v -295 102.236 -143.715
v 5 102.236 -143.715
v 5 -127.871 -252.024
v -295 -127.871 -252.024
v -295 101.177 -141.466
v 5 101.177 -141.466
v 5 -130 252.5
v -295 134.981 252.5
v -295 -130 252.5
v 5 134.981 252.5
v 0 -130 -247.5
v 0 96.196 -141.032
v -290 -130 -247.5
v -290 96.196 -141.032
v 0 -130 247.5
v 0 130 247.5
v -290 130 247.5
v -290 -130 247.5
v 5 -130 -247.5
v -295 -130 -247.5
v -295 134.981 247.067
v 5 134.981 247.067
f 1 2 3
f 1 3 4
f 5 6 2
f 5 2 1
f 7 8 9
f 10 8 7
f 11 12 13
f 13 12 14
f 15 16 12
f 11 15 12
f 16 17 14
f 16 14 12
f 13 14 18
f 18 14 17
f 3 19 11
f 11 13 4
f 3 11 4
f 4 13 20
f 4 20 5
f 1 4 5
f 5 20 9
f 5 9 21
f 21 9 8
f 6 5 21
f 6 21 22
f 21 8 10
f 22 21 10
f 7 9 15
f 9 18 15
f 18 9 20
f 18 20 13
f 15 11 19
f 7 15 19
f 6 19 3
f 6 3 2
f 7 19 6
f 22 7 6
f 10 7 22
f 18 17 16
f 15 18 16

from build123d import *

# Parameters (mm, degrees)
BOSS_EXTRUDE1_DEPTH             = 5
SKETCH2_W                       = 300
SKETCH2_H                       = 390
BOSS_EXTRUDE2_DEPTH             = 5
BOSS_EXTRUDE3_DEPTH             = 5
SKETCH4_W                       = 300
SKETCH4_H                       = 254.322327046
BOSS_EXTRUDE4_DEPTH             = 5
SKETCH7_W                       = 300
SKETCH7_H                       = 264.981182322
BOSS_EXTRUDE7_DEPTH             = 5
BOSS_EXTRUDE7_DIRECTION_2_REACH = 597.625


with BuildPart() as part:
    # Sketch1 → Boss-Extrude1 (new body)
    with BuildSketch(Plane(origin=(0, 0, 0), x_dir=(0, 0, -1), z_dir=(1, 0, 0))):
        Polygon((-247.5, 130), (-247.5, -130), (247.5, -130), (141.03222111, 96.195959421), align=None)
    extrude(amount=BOSS_EXTRUDE1_DEPTH)

    # Sketch2 → Boss-Extrude2 (add)
    with BuildSketch(Plane(origin=(0, 107.651495361, -9.366161466), x_dir=(1, 0, 0), z_dir=(0, 0.9962364643840649, -0.08667702712678799))):
        with Locations((-145, -62.836538462)):
            Rectangle(SKETCH2_W, SKETCH2_H)
    extrude(amount=BOSS_EXTRUDE2_DEPTH)

    # Sketch3 → Boss-Extrude3 (add)
    with BuildSketch(Plane.ZY.offset(295)):
        Polygon((247.5, 130), (-141.03222111, 96.195959421), (-247.5, -130), (247.5, -130), align=None)
    extrude(amount=-BOSS_EXTRUDE3_DEPTH)

    # Sketch4 → Boss-Extrude4 (add)
    with BuildSketch(Plane(origin=(0, 71.789415399, -152.520094452), x_dir=(-1, 0, 0), z_dir=(0, 0.42587111556085877, -0.904783837682211))):
        with Locations((145, -95.863836477)):
            Rectangle(SKETCH4_W, SKETCH4_H)
    extrude(amount=BOSS_EXTRUDE4_DEPTH)

    # Sketch7 → Boss-Extrude7 (add)
    with BuildSketch(Plane.XY.offset(247.5)):
        with Locations((-145, 2.490591161)):
            Rectangle(SKETCH7_W, SKETCH7_H)
    extrude(amount=BOSS_EXTRUDE7_DEPTH)

    # Boss-Extrude7 direction 2: up to this face of the body (flat: up to its plane)
    boss_extrude7_direction_2_end = Plane(part.part.faces().sort_by_distance((-145, 132.490591161, 247.283307432))[0])
    # Sketch7 → Boss-Extrude7 direction 2 (add, up to the picked face)
    with BuildSketch(Plane.XY.offset(247.5), mode=Mode.PRIVATE) as boss_extrude7_direction_2_sk1:
        with Locations((-145, 2.490591161)):
            Rectangle(SKETCH7_W, SKETCH7_H)
    boss_extrude7_direction_2_tool1 = split(extrude(boss_extrude7_direction_2_sk1.sketch, amount=-BOSS_EXTRUDE7_DIRECTION_2_REACH, mode=Mode.PRIVATE), bisect_by=boss_extrude7_direction_2_end, keep=Keep.BOTH, mode=Mode.PRIVATE)
    add(boss_extrude7_direction_2_tool1.solids().sort_by(Axis((-145, 2.490591, 247.5), (0, 0, -1)))[0])


solid = part.part
